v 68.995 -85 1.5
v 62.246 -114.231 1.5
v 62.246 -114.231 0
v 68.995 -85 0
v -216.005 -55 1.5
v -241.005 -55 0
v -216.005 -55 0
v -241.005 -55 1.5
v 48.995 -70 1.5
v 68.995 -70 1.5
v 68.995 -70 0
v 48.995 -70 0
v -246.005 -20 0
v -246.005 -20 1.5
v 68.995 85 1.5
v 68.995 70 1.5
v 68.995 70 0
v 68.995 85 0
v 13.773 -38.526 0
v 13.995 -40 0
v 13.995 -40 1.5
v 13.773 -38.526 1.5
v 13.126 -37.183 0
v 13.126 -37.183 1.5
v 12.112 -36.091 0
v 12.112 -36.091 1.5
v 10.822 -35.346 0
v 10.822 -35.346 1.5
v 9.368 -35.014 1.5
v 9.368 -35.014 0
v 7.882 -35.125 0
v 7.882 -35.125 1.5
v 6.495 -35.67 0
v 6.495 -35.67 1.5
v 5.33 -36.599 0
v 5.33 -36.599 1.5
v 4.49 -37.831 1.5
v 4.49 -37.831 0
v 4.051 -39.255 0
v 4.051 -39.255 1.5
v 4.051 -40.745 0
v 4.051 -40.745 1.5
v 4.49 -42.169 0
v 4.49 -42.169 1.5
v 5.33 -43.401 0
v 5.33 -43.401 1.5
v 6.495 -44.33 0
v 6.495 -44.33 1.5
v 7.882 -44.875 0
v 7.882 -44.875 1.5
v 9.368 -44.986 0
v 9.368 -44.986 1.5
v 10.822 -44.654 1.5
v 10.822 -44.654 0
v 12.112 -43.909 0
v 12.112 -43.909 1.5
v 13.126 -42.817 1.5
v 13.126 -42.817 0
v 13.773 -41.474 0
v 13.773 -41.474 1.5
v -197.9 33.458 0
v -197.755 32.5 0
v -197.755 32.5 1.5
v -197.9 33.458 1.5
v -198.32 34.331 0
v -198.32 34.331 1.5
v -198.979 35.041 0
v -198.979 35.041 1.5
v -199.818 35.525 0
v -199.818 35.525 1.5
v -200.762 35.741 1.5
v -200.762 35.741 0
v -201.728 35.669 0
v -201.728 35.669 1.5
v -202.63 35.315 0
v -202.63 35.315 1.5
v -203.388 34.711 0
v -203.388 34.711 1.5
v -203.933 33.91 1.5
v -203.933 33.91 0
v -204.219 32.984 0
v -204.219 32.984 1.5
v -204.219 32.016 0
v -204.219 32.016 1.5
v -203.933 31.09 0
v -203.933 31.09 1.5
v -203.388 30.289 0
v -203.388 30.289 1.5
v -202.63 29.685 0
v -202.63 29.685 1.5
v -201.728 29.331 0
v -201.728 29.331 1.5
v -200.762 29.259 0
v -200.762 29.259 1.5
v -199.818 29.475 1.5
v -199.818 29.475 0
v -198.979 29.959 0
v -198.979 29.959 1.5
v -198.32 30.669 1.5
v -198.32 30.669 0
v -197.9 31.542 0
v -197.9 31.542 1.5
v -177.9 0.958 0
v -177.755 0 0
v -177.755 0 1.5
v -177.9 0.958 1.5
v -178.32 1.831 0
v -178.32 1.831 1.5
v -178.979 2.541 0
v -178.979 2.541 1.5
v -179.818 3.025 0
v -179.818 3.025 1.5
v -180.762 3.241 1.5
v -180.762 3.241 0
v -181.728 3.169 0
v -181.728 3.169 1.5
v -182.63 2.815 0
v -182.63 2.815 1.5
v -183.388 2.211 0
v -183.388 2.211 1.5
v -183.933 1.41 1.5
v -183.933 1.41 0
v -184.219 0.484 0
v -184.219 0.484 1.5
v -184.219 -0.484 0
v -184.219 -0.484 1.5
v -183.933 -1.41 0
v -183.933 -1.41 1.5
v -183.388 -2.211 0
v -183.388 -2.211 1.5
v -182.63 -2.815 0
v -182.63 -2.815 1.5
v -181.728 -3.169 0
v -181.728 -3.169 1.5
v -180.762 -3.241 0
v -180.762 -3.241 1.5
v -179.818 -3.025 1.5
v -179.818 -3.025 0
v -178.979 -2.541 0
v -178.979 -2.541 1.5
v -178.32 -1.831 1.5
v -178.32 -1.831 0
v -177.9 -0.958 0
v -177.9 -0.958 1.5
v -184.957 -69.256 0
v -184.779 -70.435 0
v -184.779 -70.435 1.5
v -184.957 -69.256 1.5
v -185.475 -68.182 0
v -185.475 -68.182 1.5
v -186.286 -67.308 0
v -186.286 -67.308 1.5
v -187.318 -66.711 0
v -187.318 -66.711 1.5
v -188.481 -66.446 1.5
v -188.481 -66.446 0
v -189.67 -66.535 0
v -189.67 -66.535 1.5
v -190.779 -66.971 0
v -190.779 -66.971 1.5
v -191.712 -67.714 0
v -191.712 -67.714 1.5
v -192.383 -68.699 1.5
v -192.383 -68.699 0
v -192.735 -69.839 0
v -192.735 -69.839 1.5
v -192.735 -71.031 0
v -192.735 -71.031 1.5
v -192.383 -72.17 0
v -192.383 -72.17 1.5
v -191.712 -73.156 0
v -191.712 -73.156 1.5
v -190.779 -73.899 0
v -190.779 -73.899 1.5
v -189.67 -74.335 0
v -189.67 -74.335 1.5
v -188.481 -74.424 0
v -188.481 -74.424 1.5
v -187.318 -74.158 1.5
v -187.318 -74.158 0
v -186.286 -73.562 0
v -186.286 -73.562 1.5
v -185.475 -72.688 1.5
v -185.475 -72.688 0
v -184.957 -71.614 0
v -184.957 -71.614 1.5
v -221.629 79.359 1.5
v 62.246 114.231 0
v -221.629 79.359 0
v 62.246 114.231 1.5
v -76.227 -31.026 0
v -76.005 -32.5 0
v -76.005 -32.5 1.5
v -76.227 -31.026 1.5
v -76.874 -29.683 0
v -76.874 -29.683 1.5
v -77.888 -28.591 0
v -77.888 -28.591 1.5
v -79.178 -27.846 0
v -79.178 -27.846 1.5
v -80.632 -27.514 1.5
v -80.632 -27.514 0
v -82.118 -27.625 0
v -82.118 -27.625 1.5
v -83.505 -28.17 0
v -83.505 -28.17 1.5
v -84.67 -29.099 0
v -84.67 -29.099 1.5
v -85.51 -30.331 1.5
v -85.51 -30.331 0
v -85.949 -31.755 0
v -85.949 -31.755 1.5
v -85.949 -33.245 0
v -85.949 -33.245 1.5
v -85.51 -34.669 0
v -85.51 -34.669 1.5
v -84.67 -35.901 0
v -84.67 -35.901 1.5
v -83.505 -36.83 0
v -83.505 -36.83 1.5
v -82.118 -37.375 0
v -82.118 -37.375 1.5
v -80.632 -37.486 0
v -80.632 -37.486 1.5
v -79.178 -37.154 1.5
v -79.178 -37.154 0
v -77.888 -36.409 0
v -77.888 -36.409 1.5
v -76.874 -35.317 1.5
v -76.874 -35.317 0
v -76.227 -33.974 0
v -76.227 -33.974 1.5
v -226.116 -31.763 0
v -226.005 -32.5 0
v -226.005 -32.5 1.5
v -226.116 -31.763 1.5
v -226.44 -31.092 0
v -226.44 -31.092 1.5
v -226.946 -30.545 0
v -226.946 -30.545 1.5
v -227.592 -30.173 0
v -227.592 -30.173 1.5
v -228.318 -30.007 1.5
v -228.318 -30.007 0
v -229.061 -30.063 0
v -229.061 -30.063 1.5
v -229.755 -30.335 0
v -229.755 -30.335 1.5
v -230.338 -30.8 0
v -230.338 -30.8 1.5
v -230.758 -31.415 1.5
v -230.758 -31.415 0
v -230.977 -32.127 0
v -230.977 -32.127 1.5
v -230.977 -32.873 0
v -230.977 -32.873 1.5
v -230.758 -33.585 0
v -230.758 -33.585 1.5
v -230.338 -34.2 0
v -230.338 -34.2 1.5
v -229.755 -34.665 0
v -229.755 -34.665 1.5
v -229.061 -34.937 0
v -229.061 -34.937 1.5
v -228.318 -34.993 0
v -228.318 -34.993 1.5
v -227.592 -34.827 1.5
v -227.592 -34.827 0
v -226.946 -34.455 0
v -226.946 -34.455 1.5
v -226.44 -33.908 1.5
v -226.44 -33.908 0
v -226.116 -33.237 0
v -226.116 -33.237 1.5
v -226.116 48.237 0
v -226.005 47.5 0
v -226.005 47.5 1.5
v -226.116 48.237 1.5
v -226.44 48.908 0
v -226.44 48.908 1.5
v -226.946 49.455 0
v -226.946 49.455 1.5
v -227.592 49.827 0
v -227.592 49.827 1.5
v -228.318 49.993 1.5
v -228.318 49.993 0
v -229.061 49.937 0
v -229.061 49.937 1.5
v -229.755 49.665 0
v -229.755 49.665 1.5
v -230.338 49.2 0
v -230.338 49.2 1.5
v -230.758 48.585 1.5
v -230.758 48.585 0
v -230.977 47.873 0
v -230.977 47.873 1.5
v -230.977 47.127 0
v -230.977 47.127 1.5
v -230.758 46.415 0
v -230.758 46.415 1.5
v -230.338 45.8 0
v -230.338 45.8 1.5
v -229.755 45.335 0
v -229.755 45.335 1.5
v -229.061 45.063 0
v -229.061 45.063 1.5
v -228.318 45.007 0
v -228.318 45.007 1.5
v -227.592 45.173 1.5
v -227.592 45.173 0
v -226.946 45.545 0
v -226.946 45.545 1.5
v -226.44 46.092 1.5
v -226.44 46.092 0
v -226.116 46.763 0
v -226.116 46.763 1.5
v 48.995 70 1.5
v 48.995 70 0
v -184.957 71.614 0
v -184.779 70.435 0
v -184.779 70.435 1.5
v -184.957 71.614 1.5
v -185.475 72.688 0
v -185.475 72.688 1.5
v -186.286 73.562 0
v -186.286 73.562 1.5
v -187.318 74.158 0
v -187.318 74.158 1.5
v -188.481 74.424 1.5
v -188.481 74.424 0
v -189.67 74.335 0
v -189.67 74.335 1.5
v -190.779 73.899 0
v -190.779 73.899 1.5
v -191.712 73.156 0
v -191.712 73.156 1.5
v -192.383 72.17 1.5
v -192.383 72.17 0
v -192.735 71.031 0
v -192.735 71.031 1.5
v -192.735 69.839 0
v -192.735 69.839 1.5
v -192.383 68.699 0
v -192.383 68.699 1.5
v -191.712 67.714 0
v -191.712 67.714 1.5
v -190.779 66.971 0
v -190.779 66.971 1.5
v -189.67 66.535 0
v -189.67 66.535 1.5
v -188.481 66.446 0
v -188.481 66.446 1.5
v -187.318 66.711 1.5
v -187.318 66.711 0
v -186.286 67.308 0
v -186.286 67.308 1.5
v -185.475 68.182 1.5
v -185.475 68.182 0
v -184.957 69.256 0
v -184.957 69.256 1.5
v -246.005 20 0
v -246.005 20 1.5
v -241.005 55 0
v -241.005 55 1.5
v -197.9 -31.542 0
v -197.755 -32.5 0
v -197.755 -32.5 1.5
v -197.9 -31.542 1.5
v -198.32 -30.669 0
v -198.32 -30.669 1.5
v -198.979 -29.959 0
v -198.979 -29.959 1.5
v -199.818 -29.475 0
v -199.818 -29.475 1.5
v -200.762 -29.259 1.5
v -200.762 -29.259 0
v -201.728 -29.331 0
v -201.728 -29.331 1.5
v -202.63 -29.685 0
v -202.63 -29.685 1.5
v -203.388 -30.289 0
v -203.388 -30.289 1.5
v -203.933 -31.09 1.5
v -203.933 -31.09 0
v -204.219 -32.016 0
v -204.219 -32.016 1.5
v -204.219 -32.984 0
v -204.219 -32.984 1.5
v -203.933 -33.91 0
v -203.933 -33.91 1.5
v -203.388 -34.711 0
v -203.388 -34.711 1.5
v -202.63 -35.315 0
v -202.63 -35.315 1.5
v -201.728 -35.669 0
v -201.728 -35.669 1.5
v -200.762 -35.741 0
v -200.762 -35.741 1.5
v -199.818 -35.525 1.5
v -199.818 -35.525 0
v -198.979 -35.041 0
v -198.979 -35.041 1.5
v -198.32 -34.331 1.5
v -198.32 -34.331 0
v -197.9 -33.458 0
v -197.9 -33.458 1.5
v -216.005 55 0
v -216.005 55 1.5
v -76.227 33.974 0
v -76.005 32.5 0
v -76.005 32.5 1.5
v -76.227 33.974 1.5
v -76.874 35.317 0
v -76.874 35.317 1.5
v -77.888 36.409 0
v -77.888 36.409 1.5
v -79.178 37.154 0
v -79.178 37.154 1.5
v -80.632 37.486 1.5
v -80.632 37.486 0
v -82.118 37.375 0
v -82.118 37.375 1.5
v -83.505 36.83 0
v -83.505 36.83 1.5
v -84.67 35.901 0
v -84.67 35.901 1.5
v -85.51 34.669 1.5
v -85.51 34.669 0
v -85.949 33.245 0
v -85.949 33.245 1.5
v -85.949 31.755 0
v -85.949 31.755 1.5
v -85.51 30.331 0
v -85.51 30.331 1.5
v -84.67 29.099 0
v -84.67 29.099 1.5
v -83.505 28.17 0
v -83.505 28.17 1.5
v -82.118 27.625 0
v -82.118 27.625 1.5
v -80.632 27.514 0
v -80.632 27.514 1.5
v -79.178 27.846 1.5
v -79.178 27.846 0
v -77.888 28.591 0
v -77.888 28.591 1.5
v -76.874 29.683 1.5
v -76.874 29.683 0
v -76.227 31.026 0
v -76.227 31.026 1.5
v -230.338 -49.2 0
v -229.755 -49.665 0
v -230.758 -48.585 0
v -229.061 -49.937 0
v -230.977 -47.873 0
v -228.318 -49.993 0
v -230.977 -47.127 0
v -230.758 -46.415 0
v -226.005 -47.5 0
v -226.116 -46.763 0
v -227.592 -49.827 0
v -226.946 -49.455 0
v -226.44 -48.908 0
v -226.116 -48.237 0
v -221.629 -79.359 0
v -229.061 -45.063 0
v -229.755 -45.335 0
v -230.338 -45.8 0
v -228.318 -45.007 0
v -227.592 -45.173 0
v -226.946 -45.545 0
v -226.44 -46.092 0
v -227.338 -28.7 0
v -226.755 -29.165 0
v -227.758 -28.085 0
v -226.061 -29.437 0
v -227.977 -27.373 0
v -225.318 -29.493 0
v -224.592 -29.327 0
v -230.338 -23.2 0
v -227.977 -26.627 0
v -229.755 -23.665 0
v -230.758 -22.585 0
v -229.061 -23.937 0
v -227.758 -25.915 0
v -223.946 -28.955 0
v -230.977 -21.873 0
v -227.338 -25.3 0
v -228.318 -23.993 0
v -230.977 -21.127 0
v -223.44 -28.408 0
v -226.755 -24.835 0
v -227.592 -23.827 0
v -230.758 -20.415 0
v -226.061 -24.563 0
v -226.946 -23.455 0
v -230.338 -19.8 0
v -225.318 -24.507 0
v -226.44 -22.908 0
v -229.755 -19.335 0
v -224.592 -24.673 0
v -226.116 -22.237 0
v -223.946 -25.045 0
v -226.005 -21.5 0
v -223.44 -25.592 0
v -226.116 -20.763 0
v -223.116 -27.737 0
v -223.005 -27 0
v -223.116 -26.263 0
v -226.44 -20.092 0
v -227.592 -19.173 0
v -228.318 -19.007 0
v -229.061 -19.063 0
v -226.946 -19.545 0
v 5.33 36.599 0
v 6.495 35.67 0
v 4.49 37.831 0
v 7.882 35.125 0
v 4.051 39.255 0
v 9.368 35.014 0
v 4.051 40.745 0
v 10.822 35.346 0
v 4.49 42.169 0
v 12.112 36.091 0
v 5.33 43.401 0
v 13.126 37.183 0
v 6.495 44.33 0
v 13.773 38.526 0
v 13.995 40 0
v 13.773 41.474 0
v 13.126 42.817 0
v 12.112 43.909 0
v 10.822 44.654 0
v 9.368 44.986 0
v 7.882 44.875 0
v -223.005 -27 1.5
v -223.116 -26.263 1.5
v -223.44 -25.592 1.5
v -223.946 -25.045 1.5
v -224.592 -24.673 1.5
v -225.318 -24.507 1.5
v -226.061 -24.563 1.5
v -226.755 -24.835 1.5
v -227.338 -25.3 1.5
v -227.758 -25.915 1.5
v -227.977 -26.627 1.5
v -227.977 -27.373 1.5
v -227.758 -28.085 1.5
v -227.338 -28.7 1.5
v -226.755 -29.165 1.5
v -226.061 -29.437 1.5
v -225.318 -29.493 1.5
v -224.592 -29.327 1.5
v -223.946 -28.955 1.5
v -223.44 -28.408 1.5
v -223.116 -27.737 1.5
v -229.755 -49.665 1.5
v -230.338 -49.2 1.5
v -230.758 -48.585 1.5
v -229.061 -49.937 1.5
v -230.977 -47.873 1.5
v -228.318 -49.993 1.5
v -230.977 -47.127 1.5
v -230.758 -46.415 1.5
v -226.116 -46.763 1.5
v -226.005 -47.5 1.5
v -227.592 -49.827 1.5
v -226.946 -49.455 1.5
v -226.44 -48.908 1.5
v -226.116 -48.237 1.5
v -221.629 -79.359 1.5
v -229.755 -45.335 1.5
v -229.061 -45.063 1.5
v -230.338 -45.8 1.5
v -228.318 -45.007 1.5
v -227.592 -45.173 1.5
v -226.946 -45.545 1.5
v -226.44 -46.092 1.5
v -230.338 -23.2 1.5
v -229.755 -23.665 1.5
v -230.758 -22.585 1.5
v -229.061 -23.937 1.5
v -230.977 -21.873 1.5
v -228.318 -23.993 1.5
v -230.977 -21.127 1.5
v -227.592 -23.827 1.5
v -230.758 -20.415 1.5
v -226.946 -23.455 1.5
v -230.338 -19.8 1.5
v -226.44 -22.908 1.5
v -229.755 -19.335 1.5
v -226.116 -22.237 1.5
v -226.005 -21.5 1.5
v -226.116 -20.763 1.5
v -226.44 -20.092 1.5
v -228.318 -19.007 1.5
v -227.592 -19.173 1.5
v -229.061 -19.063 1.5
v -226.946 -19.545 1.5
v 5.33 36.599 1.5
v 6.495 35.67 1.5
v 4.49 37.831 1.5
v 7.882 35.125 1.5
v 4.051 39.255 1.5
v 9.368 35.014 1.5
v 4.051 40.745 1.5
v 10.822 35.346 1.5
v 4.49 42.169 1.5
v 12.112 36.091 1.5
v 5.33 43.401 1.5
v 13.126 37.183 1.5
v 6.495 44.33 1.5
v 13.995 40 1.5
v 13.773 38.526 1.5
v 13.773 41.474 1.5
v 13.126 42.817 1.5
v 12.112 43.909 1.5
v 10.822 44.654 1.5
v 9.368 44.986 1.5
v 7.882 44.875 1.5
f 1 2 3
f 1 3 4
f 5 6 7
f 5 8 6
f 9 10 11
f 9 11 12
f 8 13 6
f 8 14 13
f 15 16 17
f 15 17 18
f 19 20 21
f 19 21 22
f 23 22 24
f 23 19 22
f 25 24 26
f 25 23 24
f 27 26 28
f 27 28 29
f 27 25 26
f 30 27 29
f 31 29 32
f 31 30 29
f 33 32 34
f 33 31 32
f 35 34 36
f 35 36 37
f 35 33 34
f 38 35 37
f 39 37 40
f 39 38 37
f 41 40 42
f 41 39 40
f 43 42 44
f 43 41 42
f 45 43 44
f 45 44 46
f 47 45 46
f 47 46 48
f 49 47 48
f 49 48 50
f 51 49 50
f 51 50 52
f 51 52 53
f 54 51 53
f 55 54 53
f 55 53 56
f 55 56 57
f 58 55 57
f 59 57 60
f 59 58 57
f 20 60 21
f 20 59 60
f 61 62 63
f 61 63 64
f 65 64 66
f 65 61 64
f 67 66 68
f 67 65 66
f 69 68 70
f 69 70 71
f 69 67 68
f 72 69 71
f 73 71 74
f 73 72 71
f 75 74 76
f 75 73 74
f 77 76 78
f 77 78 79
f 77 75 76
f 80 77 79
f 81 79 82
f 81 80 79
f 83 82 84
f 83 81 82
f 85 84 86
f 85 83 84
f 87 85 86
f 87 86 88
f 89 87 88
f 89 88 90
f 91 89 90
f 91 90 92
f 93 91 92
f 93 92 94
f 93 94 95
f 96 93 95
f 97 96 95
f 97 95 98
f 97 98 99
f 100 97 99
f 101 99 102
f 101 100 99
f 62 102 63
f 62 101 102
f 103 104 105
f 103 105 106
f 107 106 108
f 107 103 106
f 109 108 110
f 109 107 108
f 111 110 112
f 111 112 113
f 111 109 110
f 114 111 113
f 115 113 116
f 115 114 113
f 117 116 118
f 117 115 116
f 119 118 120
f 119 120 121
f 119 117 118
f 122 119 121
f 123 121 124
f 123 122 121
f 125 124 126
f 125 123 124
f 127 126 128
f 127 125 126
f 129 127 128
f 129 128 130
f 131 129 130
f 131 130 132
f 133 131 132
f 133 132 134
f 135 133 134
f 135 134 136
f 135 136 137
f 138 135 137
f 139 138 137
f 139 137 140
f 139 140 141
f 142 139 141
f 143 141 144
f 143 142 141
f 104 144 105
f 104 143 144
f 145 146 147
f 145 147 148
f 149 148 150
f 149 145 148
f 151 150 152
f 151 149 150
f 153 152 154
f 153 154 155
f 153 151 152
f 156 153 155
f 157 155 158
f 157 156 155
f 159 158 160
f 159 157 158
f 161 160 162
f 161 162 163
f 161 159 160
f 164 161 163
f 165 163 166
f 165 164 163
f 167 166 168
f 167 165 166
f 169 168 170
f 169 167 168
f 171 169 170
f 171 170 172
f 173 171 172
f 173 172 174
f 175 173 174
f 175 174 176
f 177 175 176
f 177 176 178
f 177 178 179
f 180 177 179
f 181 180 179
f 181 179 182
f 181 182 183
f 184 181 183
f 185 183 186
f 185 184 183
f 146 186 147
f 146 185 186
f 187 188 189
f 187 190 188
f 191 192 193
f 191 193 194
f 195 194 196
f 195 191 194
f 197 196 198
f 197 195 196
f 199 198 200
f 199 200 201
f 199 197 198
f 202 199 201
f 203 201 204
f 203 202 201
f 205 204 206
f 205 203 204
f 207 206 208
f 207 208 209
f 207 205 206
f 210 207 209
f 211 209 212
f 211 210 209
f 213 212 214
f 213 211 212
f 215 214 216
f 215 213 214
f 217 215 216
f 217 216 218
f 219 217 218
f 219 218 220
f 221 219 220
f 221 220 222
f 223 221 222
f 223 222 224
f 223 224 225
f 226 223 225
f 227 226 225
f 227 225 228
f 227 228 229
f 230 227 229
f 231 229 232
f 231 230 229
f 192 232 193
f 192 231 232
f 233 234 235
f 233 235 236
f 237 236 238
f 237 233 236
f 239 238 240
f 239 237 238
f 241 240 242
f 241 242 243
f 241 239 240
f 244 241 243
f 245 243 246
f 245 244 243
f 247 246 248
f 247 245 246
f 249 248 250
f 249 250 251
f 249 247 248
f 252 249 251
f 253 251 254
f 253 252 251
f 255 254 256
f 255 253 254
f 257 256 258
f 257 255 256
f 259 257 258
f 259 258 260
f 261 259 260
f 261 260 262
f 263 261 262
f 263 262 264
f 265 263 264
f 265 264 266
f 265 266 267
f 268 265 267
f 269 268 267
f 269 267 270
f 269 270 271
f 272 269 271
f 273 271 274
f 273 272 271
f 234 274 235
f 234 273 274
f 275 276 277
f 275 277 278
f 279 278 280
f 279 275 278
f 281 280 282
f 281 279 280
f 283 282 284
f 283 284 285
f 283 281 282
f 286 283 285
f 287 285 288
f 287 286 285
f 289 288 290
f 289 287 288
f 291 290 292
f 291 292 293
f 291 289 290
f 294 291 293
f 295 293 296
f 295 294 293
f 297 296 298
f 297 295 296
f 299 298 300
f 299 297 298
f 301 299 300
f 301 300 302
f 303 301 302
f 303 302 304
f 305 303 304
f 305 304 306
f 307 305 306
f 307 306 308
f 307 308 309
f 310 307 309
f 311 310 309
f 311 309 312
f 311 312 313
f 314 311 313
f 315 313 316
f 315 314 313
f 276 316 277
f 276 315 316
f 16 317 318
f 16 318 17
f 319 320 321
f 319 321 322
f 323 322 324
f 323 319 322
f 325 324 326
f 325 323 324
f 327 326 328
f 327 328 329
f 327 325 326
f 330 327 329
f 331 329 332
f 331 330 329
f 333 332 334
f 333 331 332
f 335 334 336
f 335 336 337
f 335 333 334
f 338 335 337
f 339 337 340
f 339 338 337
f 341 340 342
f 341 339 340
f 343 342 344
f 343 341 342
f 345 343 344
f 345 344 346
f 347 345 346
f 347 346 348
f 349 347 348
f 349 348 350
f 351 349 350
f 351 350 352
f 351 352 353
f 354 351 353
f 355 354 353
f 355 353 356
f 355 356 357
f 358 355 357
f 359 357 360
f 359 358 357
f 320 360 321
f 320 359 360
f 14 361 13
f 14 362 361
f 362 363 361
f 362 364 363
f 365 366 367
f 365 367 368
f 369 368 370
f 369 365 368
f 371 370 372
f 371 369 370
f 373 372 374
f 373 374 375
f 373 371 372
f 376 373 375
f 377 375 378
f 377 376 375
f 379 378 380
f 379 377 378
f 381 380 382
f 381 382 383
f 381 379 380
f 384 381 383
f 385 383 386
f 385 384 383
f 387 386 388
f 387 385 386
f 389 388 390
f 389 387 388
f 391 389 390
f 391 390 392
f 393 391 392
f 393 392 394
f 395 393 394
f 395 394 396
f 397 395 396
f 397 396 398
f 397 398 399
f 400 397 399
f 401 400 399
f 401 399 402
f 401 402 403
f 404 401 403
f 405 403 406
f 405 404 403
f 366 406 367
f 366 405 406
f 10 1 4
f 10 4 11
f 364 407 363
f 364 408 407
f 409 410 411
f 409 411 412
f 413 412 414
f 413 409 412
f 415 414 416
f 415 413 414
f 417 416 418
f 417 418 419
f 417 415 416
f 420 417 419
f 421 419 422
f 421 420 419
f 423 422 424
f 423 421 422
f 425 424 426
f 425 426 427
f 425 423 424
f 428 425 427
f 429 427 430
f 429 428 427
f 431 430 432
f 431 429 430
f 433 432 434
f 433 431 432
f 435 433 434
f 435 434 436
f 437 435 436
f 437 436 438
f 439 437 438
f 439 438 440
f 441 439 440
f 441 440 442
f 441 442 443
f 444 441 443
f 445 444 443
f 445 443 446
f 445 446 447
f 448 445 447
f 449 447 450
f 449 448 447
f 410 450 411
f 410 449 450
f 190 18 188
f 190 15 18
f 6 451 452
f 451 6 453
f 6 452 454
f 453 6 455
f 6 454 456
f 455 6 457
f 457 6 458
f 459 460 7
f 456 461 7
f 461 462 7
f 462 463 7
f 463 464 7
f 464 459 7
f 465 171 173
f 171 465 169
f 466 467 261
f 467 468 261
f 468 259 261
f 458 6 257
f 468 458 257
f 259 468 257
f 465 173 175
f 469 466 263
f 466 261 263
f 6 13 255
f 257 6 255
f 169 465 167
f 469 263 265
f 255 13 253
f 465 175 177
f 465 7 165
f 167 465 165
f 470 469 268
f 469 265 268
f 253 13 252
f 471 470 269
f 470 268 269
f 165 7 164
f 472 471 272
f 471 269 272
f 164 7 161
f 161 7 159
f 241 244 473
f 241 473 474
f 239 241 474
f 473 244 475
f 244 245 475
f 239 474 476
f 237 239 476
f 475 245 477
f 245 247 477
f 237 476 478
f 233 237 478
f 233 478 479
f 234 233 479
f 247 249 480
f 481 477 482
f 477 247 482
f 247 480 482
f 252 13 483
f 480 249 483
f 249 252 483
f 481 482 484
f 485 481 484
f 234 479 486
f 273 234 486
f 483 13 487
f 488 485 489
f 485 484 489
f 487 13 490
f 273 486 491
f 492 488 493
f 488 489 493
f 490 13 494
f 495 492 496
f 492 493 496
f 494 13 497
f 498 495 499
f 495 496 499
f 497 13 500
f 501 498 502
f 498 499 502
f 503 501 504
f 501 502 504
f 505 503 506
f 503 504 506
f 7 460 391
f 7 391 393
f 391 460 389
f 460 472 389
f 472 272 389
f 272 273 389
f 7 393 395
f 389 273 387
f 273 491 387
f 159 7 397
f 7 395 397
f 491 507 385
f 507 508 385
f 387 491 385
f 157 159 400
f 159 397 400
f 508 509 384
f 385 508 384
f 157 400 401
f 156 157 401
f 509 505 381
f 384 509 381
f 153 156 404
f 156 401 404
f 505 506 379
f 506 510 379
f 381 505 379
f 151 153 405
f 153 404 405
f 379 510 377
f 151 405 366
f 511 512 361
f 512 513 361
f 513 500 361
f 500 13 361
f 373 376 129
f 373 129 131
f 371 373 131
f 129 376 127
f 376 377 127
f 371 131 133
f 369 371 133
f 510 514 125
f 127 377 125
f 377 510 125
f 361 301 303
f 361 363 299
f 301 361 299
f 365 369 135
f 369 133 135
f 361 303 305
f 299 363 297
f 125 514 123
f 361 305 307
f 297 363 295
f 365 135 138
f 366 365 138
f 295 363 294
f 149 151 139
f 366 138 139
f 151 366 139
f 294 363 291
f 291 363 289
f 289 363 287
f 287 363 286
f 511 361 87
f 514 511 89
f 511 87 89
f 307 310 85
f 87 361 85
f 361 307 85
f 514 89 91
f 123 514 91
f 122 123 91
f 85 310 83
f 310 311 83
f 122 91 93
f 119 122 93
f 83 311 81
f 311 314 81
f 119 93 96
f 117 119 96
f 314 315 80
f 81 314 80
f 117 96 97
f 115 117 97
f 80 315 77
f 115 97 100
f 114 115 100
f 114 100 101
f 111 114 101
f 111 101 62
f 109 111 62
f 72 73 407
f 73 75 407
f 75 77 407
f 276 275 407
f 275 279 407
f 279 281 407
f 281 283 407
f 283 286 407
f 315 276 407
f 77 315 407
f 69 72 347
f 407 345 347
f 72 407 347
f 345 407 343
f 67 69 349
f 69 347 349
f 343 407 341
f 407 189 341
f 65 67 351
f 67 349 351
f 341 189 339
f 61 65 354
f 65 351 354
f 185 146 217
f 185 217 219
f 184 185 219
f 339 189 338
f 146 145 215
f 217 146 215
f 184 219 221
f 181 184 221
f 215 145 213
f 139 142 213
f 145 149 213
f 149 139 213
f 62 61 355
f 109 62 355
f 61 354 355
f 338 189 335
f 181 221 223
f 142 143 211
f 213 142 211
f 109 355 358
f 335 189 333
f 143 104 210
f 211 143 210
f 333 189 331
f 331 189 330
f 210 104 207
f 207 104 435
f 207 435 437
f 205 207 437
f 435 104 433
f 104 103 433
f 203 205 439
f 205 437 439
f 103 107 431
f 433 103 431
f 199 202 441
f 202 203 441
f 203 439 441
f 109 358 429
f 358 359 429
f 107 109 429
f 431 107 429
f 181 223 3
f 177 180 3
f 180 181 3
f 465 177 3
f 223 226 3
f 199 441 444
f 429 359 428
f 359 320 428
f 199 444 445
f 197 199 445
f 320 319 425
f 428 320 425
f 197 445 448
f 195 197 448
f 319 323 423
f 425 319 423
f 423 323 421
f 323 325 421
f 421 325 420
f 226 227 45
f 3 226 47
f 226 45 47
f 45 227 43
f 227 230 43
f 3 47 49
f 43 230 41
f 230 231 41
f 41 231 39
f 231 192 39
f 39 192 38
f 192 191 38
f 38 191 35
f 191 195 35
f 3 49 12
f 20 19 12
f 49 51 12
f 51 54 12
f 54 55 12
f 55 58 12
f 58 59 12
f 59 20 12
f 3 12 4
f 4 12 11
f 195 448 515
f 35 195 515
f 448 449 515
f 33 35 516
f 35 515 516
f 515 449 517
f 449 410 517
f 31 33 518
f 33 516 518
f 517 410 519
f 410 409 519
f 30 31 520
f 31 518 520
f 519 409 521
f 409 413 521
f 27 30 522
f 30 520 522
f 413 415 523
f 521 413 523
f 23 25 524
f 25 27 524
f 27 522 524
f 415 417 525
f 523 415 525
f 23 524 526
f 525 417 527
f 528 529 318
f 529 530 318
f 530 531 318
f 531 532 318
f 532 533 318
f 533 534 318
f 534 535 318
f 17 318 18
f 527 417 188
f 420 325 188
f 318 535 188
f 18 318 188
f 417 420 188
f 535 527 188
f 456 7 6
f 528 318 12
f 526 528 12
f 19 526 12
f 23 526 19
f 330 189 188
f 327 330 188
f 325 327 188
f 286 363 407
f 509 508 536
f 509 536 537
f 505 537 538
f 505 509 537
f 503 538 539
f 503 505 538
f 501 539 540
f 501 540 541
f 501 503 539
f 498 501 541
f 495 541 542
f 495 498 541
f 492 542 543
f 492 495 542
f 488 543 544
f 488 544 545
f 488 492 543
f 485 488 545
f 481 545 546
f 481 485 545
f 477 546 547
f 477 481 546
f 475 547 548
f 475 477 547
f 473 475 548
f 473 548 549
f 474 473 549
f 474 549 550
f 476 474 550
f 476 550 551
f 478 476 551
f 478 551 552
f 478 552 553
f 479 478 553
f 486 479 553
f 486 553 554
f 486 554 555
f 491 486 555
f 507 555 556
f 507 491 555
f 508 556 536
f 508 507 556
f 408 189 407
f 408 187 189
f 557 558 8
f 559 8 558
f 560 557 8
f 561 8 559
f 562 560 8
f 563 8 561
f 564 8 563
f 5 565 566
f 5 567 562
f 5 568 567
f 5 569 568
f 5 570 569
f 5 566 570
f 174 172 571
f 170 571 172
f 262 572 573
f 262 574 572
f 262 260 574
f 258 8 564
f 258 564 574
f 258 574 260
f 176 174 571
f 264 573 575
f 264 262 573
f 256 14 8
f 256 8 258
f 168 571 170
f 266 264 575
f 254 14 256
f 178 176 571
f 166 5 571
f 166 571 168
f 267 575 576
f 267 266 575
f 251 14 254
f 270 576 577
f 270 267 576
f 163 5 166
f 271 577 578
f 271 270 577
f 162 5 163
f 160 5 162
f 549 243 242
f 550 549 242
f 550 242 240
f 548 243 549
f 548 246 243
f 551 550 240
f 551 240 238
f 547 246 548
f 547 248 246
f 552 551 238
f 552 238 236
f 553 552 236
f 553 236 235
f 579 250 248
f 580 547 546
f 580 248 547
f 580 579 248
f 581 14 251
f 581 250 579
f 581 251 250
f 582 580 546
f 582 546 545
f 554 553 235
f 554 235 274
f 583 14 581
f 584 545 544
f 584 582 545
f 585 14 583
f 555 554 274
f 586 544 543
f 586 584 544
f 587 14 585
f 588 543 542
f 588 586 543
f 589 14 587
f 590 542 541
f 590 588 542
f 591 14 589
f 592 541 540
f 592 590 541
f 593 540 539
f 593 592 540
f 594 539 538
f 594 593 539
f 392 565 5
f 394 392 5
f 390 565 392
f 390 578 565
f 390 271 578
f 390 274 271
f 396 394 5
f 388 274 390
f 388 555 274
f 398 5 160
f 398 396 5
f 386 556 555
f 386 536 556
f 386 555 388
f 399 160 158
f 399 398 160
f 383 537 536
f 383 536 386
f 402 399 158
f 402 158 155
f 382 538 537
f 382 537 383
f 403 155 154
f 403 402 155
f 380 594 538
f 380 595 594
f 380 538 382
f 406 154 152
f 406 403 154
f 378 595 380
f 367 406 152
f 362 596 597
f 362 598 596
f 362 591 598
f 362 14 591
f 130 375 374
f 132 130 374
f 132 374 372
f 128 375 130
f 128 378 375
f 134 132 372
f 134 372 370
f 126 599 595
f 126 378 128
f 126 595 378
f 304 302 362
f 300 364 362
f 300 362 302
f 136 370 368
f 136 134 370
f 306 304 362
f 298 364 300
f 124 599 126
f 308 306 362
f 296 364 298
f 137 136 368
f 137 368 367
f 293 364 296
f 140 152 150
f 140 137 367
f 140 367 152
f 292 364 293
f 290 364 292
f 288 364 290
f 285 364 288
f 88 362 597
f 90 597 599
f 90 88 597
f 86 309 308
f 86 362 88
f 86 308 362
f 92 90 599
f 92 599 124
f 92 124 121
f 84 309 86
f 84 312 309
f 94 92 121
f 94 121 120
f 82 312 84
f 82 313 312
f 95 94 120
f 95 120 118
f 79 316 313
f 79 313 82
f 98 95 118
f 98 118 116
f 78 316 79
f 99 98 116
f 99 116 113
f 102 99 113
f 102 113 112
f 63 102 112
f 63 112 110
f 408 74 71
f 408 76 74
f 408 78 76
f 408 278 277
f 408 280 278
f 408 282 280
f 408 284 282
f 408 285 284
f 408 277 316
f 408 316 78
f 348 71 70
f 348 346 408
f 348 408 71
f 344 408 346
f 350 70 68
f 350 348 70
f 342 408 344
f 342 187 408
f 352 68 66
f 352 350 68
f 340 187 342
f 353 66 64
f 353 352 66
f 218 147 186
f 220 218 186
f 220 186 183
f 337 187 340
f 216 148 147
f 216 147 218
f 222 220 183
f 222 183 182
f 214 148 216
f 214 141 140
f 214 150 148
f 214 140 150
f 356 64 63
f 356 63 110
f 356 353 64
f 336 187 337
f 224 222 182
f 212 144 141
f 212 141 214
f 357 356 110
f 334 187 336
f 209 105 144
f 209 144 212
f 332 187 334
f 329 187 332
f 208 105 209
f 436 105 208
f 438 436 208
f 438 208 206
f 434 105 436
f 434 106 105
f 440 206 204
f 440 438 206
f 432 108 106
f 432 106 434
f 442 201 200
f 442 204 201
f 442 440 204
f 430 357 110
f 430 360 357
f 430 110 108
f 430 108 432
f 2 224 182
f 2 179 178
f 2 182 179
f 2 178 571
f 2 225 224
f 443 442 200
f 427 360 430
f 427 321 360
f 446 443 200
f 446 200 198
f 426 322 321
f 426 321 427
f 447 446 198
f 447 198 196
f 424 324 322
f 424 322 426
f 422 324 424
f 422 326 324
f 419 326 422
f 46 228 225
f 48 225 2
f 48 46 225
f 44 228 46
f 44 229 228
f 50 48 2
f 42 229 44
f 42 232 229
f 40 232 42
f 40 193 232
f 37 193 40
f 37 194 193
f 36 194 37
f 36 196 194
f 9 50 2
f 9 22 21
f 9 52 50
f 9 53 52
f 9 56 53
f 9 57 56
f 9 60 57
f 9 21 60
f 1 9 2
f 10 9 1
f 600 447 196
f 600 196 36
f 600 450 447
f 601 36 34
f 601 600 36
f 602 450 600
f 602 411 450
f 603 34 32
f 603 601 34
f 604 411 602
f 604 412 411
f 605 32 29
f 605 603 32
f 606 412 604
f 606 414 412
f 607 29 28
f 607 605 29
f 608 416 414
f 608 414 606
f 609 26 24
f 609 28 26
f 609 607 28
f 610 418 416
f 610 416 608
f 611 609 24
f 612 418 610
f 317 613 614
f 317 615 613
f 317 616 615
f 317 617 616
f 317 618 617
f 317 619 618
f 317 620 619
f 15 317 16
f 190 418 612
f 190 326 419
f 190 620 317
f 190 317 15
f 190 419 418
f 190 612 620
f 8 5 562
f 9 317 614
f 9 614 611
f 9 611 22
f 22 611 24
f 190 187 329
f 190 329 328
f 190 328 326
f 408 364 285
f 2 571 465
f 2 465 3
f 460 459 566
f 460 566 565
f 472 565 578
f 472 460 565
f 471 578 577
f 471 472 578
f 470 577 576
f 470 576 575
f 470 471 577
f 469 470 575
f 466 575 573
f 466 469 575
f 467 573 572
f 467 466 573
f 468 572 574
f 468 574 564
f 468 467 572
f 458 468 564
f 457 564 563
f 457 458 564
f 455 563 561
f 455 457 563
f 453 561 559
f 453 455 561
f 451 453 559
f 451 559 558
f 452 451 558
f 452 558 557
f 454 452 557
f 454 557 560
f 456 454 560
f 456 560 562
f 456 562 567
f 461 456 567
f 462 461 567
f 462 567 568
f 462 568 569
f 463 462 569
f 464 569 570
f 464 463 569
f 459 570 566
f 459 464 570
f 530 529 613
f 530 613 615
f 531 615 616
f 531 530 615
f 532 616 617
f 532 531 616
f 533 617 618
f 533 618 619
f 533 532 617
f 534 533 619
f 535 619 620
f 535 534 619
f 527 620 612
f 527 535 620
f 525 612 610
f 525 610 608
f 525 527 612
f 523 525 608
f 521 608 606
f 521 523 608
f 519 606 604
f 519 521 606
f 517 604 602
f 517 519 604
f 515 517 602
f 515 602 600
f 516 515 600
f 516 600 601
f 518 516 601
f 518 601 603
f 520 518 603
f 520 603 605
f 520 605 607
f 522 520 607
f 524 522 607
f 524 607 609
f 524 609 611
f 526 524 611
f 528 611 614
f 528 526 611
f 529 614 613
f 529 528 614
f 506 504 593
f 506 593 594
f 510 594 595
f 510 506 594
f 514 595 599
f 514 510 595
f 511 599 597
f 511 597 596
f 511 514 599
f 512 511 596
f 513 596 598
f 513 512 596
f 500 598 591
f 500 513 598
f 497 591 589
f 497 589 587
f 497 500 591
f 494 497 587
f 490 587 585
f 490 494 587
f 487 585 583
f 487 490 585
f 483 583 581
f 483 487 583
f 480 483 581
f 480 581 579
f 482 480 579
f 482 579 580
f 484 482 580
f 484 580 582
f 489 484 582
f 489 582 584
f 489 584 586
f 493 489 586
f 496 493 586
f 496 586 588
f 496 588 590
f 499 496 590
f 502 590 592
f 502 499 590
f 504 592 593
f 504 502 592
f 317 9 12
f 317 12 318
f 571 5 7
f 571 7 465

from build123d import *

# Parameters (mm, degrees)
SKIZZE1_R                            = 2.5
SKIZZE1_R_2                          = 5
SKIZZE1_R_3                          = 3.25
SKIZZE1_R_4                          = 4
AUFSATZ_LINEAR_AUSTRAGEN2_DEPTH      = 1.5
AUFSATZ_LINEAR_AUSTRAGEN2_DEPTH_BACK = 0.0001


with BuildPart() as part:
    # Skizze1 → Aufsatz-Linear austragen2 (new body, two sides)
    with BuildSketch(Plane.XY) as aufsatz_linear_austragen2_sk:
        Polygon((-241.005153528, -55), (-216.005153528, -55), (-221.628929887, -79.35925162), (62.246314842, -114.231101944), (68.994846472, -85), (68.994846472, -70), (48.994846472, -70), (48.994846472, 70), (68.994846472, 70), (68.994846472, 85), (62.246314842, 114.231101944), (-221.628929887, 79.35925162), (-216.005153528, 55), (-241.005153528, 55), (-246.005153528, 20), (-246.005153528, -20), align=None)
        with Locations((-228.505153528, -47.5)):
            Circle(SKIZZE1_R, mode=Mode.SUBTRACT)
        with Locations((-228.505153528, -32.5)):
            Circle(SKIZZE1_R, mode=Mode.SUBTRACT)
        with Locations((-228.505153528, -21.5)):
            Circle(SKIZZE1_R, mode=Mode.SUBTRACT)
        with Locations((-225.505153528, -27)):
            Circle(SKIZZE1_R, mode=Mode.SUBTRACT)
        with Locations((-228.505153528, 47.5)):
            Circle(SKIZZE1_R, mode=Mode.SUBTRACT)
        with Locations((8.994846472, 40)):
            Circle(SKIZZE1_R_2, mode=Mode.SUBTRACT)
        with Locations((-201.005153528, -32.5)):
            Circle(SKIZZE1_R_3, mode=Mode.SUBTRACT)
        with Locations((-181.005153528, 0)):
            Circle(SKIZZE1_R_3, mode=Mode.SUBTRACT)
        with Locations((-81.005153528, -32.5)):
            Circle(SKIZZE1_R_2, mode=Mode.SUBTRACT)
        with Locations((8.994846472, -40)):
            Circle(SKIZZE1_R_2, mode=Mode.SUBTRACT)
        with Locations((-201.005153528, 32.5)):
            Circle(SKIZZE1_R_3, mode=Mode.SUBTRACT)
        with Locations((-81.005153528, 32.5)):
            Circle(SKIZZE1_R_2, mode=Mode.SUBTRACT)
        with Locations((-188.77946315, -70.434923444)):
            Circle(SKIZZE1_R_4, mode=Mode.SUBTRACT)
        with Locations((-188.77946315, 70.434923444)):
            Circle(SKIZZE1_R_4, mode=Mode.SUBTRACT)
    extrude(amount=AUFSATZ_LINEAR_AUSTRAGEN2_DEPTH)
    extrude(aufsatz_linear_austragen2_sk.sketch, amount=-AUFSATZ_LINEAR_AUSTRAGEN2_DEPTH_BACK)


solid = part.part
